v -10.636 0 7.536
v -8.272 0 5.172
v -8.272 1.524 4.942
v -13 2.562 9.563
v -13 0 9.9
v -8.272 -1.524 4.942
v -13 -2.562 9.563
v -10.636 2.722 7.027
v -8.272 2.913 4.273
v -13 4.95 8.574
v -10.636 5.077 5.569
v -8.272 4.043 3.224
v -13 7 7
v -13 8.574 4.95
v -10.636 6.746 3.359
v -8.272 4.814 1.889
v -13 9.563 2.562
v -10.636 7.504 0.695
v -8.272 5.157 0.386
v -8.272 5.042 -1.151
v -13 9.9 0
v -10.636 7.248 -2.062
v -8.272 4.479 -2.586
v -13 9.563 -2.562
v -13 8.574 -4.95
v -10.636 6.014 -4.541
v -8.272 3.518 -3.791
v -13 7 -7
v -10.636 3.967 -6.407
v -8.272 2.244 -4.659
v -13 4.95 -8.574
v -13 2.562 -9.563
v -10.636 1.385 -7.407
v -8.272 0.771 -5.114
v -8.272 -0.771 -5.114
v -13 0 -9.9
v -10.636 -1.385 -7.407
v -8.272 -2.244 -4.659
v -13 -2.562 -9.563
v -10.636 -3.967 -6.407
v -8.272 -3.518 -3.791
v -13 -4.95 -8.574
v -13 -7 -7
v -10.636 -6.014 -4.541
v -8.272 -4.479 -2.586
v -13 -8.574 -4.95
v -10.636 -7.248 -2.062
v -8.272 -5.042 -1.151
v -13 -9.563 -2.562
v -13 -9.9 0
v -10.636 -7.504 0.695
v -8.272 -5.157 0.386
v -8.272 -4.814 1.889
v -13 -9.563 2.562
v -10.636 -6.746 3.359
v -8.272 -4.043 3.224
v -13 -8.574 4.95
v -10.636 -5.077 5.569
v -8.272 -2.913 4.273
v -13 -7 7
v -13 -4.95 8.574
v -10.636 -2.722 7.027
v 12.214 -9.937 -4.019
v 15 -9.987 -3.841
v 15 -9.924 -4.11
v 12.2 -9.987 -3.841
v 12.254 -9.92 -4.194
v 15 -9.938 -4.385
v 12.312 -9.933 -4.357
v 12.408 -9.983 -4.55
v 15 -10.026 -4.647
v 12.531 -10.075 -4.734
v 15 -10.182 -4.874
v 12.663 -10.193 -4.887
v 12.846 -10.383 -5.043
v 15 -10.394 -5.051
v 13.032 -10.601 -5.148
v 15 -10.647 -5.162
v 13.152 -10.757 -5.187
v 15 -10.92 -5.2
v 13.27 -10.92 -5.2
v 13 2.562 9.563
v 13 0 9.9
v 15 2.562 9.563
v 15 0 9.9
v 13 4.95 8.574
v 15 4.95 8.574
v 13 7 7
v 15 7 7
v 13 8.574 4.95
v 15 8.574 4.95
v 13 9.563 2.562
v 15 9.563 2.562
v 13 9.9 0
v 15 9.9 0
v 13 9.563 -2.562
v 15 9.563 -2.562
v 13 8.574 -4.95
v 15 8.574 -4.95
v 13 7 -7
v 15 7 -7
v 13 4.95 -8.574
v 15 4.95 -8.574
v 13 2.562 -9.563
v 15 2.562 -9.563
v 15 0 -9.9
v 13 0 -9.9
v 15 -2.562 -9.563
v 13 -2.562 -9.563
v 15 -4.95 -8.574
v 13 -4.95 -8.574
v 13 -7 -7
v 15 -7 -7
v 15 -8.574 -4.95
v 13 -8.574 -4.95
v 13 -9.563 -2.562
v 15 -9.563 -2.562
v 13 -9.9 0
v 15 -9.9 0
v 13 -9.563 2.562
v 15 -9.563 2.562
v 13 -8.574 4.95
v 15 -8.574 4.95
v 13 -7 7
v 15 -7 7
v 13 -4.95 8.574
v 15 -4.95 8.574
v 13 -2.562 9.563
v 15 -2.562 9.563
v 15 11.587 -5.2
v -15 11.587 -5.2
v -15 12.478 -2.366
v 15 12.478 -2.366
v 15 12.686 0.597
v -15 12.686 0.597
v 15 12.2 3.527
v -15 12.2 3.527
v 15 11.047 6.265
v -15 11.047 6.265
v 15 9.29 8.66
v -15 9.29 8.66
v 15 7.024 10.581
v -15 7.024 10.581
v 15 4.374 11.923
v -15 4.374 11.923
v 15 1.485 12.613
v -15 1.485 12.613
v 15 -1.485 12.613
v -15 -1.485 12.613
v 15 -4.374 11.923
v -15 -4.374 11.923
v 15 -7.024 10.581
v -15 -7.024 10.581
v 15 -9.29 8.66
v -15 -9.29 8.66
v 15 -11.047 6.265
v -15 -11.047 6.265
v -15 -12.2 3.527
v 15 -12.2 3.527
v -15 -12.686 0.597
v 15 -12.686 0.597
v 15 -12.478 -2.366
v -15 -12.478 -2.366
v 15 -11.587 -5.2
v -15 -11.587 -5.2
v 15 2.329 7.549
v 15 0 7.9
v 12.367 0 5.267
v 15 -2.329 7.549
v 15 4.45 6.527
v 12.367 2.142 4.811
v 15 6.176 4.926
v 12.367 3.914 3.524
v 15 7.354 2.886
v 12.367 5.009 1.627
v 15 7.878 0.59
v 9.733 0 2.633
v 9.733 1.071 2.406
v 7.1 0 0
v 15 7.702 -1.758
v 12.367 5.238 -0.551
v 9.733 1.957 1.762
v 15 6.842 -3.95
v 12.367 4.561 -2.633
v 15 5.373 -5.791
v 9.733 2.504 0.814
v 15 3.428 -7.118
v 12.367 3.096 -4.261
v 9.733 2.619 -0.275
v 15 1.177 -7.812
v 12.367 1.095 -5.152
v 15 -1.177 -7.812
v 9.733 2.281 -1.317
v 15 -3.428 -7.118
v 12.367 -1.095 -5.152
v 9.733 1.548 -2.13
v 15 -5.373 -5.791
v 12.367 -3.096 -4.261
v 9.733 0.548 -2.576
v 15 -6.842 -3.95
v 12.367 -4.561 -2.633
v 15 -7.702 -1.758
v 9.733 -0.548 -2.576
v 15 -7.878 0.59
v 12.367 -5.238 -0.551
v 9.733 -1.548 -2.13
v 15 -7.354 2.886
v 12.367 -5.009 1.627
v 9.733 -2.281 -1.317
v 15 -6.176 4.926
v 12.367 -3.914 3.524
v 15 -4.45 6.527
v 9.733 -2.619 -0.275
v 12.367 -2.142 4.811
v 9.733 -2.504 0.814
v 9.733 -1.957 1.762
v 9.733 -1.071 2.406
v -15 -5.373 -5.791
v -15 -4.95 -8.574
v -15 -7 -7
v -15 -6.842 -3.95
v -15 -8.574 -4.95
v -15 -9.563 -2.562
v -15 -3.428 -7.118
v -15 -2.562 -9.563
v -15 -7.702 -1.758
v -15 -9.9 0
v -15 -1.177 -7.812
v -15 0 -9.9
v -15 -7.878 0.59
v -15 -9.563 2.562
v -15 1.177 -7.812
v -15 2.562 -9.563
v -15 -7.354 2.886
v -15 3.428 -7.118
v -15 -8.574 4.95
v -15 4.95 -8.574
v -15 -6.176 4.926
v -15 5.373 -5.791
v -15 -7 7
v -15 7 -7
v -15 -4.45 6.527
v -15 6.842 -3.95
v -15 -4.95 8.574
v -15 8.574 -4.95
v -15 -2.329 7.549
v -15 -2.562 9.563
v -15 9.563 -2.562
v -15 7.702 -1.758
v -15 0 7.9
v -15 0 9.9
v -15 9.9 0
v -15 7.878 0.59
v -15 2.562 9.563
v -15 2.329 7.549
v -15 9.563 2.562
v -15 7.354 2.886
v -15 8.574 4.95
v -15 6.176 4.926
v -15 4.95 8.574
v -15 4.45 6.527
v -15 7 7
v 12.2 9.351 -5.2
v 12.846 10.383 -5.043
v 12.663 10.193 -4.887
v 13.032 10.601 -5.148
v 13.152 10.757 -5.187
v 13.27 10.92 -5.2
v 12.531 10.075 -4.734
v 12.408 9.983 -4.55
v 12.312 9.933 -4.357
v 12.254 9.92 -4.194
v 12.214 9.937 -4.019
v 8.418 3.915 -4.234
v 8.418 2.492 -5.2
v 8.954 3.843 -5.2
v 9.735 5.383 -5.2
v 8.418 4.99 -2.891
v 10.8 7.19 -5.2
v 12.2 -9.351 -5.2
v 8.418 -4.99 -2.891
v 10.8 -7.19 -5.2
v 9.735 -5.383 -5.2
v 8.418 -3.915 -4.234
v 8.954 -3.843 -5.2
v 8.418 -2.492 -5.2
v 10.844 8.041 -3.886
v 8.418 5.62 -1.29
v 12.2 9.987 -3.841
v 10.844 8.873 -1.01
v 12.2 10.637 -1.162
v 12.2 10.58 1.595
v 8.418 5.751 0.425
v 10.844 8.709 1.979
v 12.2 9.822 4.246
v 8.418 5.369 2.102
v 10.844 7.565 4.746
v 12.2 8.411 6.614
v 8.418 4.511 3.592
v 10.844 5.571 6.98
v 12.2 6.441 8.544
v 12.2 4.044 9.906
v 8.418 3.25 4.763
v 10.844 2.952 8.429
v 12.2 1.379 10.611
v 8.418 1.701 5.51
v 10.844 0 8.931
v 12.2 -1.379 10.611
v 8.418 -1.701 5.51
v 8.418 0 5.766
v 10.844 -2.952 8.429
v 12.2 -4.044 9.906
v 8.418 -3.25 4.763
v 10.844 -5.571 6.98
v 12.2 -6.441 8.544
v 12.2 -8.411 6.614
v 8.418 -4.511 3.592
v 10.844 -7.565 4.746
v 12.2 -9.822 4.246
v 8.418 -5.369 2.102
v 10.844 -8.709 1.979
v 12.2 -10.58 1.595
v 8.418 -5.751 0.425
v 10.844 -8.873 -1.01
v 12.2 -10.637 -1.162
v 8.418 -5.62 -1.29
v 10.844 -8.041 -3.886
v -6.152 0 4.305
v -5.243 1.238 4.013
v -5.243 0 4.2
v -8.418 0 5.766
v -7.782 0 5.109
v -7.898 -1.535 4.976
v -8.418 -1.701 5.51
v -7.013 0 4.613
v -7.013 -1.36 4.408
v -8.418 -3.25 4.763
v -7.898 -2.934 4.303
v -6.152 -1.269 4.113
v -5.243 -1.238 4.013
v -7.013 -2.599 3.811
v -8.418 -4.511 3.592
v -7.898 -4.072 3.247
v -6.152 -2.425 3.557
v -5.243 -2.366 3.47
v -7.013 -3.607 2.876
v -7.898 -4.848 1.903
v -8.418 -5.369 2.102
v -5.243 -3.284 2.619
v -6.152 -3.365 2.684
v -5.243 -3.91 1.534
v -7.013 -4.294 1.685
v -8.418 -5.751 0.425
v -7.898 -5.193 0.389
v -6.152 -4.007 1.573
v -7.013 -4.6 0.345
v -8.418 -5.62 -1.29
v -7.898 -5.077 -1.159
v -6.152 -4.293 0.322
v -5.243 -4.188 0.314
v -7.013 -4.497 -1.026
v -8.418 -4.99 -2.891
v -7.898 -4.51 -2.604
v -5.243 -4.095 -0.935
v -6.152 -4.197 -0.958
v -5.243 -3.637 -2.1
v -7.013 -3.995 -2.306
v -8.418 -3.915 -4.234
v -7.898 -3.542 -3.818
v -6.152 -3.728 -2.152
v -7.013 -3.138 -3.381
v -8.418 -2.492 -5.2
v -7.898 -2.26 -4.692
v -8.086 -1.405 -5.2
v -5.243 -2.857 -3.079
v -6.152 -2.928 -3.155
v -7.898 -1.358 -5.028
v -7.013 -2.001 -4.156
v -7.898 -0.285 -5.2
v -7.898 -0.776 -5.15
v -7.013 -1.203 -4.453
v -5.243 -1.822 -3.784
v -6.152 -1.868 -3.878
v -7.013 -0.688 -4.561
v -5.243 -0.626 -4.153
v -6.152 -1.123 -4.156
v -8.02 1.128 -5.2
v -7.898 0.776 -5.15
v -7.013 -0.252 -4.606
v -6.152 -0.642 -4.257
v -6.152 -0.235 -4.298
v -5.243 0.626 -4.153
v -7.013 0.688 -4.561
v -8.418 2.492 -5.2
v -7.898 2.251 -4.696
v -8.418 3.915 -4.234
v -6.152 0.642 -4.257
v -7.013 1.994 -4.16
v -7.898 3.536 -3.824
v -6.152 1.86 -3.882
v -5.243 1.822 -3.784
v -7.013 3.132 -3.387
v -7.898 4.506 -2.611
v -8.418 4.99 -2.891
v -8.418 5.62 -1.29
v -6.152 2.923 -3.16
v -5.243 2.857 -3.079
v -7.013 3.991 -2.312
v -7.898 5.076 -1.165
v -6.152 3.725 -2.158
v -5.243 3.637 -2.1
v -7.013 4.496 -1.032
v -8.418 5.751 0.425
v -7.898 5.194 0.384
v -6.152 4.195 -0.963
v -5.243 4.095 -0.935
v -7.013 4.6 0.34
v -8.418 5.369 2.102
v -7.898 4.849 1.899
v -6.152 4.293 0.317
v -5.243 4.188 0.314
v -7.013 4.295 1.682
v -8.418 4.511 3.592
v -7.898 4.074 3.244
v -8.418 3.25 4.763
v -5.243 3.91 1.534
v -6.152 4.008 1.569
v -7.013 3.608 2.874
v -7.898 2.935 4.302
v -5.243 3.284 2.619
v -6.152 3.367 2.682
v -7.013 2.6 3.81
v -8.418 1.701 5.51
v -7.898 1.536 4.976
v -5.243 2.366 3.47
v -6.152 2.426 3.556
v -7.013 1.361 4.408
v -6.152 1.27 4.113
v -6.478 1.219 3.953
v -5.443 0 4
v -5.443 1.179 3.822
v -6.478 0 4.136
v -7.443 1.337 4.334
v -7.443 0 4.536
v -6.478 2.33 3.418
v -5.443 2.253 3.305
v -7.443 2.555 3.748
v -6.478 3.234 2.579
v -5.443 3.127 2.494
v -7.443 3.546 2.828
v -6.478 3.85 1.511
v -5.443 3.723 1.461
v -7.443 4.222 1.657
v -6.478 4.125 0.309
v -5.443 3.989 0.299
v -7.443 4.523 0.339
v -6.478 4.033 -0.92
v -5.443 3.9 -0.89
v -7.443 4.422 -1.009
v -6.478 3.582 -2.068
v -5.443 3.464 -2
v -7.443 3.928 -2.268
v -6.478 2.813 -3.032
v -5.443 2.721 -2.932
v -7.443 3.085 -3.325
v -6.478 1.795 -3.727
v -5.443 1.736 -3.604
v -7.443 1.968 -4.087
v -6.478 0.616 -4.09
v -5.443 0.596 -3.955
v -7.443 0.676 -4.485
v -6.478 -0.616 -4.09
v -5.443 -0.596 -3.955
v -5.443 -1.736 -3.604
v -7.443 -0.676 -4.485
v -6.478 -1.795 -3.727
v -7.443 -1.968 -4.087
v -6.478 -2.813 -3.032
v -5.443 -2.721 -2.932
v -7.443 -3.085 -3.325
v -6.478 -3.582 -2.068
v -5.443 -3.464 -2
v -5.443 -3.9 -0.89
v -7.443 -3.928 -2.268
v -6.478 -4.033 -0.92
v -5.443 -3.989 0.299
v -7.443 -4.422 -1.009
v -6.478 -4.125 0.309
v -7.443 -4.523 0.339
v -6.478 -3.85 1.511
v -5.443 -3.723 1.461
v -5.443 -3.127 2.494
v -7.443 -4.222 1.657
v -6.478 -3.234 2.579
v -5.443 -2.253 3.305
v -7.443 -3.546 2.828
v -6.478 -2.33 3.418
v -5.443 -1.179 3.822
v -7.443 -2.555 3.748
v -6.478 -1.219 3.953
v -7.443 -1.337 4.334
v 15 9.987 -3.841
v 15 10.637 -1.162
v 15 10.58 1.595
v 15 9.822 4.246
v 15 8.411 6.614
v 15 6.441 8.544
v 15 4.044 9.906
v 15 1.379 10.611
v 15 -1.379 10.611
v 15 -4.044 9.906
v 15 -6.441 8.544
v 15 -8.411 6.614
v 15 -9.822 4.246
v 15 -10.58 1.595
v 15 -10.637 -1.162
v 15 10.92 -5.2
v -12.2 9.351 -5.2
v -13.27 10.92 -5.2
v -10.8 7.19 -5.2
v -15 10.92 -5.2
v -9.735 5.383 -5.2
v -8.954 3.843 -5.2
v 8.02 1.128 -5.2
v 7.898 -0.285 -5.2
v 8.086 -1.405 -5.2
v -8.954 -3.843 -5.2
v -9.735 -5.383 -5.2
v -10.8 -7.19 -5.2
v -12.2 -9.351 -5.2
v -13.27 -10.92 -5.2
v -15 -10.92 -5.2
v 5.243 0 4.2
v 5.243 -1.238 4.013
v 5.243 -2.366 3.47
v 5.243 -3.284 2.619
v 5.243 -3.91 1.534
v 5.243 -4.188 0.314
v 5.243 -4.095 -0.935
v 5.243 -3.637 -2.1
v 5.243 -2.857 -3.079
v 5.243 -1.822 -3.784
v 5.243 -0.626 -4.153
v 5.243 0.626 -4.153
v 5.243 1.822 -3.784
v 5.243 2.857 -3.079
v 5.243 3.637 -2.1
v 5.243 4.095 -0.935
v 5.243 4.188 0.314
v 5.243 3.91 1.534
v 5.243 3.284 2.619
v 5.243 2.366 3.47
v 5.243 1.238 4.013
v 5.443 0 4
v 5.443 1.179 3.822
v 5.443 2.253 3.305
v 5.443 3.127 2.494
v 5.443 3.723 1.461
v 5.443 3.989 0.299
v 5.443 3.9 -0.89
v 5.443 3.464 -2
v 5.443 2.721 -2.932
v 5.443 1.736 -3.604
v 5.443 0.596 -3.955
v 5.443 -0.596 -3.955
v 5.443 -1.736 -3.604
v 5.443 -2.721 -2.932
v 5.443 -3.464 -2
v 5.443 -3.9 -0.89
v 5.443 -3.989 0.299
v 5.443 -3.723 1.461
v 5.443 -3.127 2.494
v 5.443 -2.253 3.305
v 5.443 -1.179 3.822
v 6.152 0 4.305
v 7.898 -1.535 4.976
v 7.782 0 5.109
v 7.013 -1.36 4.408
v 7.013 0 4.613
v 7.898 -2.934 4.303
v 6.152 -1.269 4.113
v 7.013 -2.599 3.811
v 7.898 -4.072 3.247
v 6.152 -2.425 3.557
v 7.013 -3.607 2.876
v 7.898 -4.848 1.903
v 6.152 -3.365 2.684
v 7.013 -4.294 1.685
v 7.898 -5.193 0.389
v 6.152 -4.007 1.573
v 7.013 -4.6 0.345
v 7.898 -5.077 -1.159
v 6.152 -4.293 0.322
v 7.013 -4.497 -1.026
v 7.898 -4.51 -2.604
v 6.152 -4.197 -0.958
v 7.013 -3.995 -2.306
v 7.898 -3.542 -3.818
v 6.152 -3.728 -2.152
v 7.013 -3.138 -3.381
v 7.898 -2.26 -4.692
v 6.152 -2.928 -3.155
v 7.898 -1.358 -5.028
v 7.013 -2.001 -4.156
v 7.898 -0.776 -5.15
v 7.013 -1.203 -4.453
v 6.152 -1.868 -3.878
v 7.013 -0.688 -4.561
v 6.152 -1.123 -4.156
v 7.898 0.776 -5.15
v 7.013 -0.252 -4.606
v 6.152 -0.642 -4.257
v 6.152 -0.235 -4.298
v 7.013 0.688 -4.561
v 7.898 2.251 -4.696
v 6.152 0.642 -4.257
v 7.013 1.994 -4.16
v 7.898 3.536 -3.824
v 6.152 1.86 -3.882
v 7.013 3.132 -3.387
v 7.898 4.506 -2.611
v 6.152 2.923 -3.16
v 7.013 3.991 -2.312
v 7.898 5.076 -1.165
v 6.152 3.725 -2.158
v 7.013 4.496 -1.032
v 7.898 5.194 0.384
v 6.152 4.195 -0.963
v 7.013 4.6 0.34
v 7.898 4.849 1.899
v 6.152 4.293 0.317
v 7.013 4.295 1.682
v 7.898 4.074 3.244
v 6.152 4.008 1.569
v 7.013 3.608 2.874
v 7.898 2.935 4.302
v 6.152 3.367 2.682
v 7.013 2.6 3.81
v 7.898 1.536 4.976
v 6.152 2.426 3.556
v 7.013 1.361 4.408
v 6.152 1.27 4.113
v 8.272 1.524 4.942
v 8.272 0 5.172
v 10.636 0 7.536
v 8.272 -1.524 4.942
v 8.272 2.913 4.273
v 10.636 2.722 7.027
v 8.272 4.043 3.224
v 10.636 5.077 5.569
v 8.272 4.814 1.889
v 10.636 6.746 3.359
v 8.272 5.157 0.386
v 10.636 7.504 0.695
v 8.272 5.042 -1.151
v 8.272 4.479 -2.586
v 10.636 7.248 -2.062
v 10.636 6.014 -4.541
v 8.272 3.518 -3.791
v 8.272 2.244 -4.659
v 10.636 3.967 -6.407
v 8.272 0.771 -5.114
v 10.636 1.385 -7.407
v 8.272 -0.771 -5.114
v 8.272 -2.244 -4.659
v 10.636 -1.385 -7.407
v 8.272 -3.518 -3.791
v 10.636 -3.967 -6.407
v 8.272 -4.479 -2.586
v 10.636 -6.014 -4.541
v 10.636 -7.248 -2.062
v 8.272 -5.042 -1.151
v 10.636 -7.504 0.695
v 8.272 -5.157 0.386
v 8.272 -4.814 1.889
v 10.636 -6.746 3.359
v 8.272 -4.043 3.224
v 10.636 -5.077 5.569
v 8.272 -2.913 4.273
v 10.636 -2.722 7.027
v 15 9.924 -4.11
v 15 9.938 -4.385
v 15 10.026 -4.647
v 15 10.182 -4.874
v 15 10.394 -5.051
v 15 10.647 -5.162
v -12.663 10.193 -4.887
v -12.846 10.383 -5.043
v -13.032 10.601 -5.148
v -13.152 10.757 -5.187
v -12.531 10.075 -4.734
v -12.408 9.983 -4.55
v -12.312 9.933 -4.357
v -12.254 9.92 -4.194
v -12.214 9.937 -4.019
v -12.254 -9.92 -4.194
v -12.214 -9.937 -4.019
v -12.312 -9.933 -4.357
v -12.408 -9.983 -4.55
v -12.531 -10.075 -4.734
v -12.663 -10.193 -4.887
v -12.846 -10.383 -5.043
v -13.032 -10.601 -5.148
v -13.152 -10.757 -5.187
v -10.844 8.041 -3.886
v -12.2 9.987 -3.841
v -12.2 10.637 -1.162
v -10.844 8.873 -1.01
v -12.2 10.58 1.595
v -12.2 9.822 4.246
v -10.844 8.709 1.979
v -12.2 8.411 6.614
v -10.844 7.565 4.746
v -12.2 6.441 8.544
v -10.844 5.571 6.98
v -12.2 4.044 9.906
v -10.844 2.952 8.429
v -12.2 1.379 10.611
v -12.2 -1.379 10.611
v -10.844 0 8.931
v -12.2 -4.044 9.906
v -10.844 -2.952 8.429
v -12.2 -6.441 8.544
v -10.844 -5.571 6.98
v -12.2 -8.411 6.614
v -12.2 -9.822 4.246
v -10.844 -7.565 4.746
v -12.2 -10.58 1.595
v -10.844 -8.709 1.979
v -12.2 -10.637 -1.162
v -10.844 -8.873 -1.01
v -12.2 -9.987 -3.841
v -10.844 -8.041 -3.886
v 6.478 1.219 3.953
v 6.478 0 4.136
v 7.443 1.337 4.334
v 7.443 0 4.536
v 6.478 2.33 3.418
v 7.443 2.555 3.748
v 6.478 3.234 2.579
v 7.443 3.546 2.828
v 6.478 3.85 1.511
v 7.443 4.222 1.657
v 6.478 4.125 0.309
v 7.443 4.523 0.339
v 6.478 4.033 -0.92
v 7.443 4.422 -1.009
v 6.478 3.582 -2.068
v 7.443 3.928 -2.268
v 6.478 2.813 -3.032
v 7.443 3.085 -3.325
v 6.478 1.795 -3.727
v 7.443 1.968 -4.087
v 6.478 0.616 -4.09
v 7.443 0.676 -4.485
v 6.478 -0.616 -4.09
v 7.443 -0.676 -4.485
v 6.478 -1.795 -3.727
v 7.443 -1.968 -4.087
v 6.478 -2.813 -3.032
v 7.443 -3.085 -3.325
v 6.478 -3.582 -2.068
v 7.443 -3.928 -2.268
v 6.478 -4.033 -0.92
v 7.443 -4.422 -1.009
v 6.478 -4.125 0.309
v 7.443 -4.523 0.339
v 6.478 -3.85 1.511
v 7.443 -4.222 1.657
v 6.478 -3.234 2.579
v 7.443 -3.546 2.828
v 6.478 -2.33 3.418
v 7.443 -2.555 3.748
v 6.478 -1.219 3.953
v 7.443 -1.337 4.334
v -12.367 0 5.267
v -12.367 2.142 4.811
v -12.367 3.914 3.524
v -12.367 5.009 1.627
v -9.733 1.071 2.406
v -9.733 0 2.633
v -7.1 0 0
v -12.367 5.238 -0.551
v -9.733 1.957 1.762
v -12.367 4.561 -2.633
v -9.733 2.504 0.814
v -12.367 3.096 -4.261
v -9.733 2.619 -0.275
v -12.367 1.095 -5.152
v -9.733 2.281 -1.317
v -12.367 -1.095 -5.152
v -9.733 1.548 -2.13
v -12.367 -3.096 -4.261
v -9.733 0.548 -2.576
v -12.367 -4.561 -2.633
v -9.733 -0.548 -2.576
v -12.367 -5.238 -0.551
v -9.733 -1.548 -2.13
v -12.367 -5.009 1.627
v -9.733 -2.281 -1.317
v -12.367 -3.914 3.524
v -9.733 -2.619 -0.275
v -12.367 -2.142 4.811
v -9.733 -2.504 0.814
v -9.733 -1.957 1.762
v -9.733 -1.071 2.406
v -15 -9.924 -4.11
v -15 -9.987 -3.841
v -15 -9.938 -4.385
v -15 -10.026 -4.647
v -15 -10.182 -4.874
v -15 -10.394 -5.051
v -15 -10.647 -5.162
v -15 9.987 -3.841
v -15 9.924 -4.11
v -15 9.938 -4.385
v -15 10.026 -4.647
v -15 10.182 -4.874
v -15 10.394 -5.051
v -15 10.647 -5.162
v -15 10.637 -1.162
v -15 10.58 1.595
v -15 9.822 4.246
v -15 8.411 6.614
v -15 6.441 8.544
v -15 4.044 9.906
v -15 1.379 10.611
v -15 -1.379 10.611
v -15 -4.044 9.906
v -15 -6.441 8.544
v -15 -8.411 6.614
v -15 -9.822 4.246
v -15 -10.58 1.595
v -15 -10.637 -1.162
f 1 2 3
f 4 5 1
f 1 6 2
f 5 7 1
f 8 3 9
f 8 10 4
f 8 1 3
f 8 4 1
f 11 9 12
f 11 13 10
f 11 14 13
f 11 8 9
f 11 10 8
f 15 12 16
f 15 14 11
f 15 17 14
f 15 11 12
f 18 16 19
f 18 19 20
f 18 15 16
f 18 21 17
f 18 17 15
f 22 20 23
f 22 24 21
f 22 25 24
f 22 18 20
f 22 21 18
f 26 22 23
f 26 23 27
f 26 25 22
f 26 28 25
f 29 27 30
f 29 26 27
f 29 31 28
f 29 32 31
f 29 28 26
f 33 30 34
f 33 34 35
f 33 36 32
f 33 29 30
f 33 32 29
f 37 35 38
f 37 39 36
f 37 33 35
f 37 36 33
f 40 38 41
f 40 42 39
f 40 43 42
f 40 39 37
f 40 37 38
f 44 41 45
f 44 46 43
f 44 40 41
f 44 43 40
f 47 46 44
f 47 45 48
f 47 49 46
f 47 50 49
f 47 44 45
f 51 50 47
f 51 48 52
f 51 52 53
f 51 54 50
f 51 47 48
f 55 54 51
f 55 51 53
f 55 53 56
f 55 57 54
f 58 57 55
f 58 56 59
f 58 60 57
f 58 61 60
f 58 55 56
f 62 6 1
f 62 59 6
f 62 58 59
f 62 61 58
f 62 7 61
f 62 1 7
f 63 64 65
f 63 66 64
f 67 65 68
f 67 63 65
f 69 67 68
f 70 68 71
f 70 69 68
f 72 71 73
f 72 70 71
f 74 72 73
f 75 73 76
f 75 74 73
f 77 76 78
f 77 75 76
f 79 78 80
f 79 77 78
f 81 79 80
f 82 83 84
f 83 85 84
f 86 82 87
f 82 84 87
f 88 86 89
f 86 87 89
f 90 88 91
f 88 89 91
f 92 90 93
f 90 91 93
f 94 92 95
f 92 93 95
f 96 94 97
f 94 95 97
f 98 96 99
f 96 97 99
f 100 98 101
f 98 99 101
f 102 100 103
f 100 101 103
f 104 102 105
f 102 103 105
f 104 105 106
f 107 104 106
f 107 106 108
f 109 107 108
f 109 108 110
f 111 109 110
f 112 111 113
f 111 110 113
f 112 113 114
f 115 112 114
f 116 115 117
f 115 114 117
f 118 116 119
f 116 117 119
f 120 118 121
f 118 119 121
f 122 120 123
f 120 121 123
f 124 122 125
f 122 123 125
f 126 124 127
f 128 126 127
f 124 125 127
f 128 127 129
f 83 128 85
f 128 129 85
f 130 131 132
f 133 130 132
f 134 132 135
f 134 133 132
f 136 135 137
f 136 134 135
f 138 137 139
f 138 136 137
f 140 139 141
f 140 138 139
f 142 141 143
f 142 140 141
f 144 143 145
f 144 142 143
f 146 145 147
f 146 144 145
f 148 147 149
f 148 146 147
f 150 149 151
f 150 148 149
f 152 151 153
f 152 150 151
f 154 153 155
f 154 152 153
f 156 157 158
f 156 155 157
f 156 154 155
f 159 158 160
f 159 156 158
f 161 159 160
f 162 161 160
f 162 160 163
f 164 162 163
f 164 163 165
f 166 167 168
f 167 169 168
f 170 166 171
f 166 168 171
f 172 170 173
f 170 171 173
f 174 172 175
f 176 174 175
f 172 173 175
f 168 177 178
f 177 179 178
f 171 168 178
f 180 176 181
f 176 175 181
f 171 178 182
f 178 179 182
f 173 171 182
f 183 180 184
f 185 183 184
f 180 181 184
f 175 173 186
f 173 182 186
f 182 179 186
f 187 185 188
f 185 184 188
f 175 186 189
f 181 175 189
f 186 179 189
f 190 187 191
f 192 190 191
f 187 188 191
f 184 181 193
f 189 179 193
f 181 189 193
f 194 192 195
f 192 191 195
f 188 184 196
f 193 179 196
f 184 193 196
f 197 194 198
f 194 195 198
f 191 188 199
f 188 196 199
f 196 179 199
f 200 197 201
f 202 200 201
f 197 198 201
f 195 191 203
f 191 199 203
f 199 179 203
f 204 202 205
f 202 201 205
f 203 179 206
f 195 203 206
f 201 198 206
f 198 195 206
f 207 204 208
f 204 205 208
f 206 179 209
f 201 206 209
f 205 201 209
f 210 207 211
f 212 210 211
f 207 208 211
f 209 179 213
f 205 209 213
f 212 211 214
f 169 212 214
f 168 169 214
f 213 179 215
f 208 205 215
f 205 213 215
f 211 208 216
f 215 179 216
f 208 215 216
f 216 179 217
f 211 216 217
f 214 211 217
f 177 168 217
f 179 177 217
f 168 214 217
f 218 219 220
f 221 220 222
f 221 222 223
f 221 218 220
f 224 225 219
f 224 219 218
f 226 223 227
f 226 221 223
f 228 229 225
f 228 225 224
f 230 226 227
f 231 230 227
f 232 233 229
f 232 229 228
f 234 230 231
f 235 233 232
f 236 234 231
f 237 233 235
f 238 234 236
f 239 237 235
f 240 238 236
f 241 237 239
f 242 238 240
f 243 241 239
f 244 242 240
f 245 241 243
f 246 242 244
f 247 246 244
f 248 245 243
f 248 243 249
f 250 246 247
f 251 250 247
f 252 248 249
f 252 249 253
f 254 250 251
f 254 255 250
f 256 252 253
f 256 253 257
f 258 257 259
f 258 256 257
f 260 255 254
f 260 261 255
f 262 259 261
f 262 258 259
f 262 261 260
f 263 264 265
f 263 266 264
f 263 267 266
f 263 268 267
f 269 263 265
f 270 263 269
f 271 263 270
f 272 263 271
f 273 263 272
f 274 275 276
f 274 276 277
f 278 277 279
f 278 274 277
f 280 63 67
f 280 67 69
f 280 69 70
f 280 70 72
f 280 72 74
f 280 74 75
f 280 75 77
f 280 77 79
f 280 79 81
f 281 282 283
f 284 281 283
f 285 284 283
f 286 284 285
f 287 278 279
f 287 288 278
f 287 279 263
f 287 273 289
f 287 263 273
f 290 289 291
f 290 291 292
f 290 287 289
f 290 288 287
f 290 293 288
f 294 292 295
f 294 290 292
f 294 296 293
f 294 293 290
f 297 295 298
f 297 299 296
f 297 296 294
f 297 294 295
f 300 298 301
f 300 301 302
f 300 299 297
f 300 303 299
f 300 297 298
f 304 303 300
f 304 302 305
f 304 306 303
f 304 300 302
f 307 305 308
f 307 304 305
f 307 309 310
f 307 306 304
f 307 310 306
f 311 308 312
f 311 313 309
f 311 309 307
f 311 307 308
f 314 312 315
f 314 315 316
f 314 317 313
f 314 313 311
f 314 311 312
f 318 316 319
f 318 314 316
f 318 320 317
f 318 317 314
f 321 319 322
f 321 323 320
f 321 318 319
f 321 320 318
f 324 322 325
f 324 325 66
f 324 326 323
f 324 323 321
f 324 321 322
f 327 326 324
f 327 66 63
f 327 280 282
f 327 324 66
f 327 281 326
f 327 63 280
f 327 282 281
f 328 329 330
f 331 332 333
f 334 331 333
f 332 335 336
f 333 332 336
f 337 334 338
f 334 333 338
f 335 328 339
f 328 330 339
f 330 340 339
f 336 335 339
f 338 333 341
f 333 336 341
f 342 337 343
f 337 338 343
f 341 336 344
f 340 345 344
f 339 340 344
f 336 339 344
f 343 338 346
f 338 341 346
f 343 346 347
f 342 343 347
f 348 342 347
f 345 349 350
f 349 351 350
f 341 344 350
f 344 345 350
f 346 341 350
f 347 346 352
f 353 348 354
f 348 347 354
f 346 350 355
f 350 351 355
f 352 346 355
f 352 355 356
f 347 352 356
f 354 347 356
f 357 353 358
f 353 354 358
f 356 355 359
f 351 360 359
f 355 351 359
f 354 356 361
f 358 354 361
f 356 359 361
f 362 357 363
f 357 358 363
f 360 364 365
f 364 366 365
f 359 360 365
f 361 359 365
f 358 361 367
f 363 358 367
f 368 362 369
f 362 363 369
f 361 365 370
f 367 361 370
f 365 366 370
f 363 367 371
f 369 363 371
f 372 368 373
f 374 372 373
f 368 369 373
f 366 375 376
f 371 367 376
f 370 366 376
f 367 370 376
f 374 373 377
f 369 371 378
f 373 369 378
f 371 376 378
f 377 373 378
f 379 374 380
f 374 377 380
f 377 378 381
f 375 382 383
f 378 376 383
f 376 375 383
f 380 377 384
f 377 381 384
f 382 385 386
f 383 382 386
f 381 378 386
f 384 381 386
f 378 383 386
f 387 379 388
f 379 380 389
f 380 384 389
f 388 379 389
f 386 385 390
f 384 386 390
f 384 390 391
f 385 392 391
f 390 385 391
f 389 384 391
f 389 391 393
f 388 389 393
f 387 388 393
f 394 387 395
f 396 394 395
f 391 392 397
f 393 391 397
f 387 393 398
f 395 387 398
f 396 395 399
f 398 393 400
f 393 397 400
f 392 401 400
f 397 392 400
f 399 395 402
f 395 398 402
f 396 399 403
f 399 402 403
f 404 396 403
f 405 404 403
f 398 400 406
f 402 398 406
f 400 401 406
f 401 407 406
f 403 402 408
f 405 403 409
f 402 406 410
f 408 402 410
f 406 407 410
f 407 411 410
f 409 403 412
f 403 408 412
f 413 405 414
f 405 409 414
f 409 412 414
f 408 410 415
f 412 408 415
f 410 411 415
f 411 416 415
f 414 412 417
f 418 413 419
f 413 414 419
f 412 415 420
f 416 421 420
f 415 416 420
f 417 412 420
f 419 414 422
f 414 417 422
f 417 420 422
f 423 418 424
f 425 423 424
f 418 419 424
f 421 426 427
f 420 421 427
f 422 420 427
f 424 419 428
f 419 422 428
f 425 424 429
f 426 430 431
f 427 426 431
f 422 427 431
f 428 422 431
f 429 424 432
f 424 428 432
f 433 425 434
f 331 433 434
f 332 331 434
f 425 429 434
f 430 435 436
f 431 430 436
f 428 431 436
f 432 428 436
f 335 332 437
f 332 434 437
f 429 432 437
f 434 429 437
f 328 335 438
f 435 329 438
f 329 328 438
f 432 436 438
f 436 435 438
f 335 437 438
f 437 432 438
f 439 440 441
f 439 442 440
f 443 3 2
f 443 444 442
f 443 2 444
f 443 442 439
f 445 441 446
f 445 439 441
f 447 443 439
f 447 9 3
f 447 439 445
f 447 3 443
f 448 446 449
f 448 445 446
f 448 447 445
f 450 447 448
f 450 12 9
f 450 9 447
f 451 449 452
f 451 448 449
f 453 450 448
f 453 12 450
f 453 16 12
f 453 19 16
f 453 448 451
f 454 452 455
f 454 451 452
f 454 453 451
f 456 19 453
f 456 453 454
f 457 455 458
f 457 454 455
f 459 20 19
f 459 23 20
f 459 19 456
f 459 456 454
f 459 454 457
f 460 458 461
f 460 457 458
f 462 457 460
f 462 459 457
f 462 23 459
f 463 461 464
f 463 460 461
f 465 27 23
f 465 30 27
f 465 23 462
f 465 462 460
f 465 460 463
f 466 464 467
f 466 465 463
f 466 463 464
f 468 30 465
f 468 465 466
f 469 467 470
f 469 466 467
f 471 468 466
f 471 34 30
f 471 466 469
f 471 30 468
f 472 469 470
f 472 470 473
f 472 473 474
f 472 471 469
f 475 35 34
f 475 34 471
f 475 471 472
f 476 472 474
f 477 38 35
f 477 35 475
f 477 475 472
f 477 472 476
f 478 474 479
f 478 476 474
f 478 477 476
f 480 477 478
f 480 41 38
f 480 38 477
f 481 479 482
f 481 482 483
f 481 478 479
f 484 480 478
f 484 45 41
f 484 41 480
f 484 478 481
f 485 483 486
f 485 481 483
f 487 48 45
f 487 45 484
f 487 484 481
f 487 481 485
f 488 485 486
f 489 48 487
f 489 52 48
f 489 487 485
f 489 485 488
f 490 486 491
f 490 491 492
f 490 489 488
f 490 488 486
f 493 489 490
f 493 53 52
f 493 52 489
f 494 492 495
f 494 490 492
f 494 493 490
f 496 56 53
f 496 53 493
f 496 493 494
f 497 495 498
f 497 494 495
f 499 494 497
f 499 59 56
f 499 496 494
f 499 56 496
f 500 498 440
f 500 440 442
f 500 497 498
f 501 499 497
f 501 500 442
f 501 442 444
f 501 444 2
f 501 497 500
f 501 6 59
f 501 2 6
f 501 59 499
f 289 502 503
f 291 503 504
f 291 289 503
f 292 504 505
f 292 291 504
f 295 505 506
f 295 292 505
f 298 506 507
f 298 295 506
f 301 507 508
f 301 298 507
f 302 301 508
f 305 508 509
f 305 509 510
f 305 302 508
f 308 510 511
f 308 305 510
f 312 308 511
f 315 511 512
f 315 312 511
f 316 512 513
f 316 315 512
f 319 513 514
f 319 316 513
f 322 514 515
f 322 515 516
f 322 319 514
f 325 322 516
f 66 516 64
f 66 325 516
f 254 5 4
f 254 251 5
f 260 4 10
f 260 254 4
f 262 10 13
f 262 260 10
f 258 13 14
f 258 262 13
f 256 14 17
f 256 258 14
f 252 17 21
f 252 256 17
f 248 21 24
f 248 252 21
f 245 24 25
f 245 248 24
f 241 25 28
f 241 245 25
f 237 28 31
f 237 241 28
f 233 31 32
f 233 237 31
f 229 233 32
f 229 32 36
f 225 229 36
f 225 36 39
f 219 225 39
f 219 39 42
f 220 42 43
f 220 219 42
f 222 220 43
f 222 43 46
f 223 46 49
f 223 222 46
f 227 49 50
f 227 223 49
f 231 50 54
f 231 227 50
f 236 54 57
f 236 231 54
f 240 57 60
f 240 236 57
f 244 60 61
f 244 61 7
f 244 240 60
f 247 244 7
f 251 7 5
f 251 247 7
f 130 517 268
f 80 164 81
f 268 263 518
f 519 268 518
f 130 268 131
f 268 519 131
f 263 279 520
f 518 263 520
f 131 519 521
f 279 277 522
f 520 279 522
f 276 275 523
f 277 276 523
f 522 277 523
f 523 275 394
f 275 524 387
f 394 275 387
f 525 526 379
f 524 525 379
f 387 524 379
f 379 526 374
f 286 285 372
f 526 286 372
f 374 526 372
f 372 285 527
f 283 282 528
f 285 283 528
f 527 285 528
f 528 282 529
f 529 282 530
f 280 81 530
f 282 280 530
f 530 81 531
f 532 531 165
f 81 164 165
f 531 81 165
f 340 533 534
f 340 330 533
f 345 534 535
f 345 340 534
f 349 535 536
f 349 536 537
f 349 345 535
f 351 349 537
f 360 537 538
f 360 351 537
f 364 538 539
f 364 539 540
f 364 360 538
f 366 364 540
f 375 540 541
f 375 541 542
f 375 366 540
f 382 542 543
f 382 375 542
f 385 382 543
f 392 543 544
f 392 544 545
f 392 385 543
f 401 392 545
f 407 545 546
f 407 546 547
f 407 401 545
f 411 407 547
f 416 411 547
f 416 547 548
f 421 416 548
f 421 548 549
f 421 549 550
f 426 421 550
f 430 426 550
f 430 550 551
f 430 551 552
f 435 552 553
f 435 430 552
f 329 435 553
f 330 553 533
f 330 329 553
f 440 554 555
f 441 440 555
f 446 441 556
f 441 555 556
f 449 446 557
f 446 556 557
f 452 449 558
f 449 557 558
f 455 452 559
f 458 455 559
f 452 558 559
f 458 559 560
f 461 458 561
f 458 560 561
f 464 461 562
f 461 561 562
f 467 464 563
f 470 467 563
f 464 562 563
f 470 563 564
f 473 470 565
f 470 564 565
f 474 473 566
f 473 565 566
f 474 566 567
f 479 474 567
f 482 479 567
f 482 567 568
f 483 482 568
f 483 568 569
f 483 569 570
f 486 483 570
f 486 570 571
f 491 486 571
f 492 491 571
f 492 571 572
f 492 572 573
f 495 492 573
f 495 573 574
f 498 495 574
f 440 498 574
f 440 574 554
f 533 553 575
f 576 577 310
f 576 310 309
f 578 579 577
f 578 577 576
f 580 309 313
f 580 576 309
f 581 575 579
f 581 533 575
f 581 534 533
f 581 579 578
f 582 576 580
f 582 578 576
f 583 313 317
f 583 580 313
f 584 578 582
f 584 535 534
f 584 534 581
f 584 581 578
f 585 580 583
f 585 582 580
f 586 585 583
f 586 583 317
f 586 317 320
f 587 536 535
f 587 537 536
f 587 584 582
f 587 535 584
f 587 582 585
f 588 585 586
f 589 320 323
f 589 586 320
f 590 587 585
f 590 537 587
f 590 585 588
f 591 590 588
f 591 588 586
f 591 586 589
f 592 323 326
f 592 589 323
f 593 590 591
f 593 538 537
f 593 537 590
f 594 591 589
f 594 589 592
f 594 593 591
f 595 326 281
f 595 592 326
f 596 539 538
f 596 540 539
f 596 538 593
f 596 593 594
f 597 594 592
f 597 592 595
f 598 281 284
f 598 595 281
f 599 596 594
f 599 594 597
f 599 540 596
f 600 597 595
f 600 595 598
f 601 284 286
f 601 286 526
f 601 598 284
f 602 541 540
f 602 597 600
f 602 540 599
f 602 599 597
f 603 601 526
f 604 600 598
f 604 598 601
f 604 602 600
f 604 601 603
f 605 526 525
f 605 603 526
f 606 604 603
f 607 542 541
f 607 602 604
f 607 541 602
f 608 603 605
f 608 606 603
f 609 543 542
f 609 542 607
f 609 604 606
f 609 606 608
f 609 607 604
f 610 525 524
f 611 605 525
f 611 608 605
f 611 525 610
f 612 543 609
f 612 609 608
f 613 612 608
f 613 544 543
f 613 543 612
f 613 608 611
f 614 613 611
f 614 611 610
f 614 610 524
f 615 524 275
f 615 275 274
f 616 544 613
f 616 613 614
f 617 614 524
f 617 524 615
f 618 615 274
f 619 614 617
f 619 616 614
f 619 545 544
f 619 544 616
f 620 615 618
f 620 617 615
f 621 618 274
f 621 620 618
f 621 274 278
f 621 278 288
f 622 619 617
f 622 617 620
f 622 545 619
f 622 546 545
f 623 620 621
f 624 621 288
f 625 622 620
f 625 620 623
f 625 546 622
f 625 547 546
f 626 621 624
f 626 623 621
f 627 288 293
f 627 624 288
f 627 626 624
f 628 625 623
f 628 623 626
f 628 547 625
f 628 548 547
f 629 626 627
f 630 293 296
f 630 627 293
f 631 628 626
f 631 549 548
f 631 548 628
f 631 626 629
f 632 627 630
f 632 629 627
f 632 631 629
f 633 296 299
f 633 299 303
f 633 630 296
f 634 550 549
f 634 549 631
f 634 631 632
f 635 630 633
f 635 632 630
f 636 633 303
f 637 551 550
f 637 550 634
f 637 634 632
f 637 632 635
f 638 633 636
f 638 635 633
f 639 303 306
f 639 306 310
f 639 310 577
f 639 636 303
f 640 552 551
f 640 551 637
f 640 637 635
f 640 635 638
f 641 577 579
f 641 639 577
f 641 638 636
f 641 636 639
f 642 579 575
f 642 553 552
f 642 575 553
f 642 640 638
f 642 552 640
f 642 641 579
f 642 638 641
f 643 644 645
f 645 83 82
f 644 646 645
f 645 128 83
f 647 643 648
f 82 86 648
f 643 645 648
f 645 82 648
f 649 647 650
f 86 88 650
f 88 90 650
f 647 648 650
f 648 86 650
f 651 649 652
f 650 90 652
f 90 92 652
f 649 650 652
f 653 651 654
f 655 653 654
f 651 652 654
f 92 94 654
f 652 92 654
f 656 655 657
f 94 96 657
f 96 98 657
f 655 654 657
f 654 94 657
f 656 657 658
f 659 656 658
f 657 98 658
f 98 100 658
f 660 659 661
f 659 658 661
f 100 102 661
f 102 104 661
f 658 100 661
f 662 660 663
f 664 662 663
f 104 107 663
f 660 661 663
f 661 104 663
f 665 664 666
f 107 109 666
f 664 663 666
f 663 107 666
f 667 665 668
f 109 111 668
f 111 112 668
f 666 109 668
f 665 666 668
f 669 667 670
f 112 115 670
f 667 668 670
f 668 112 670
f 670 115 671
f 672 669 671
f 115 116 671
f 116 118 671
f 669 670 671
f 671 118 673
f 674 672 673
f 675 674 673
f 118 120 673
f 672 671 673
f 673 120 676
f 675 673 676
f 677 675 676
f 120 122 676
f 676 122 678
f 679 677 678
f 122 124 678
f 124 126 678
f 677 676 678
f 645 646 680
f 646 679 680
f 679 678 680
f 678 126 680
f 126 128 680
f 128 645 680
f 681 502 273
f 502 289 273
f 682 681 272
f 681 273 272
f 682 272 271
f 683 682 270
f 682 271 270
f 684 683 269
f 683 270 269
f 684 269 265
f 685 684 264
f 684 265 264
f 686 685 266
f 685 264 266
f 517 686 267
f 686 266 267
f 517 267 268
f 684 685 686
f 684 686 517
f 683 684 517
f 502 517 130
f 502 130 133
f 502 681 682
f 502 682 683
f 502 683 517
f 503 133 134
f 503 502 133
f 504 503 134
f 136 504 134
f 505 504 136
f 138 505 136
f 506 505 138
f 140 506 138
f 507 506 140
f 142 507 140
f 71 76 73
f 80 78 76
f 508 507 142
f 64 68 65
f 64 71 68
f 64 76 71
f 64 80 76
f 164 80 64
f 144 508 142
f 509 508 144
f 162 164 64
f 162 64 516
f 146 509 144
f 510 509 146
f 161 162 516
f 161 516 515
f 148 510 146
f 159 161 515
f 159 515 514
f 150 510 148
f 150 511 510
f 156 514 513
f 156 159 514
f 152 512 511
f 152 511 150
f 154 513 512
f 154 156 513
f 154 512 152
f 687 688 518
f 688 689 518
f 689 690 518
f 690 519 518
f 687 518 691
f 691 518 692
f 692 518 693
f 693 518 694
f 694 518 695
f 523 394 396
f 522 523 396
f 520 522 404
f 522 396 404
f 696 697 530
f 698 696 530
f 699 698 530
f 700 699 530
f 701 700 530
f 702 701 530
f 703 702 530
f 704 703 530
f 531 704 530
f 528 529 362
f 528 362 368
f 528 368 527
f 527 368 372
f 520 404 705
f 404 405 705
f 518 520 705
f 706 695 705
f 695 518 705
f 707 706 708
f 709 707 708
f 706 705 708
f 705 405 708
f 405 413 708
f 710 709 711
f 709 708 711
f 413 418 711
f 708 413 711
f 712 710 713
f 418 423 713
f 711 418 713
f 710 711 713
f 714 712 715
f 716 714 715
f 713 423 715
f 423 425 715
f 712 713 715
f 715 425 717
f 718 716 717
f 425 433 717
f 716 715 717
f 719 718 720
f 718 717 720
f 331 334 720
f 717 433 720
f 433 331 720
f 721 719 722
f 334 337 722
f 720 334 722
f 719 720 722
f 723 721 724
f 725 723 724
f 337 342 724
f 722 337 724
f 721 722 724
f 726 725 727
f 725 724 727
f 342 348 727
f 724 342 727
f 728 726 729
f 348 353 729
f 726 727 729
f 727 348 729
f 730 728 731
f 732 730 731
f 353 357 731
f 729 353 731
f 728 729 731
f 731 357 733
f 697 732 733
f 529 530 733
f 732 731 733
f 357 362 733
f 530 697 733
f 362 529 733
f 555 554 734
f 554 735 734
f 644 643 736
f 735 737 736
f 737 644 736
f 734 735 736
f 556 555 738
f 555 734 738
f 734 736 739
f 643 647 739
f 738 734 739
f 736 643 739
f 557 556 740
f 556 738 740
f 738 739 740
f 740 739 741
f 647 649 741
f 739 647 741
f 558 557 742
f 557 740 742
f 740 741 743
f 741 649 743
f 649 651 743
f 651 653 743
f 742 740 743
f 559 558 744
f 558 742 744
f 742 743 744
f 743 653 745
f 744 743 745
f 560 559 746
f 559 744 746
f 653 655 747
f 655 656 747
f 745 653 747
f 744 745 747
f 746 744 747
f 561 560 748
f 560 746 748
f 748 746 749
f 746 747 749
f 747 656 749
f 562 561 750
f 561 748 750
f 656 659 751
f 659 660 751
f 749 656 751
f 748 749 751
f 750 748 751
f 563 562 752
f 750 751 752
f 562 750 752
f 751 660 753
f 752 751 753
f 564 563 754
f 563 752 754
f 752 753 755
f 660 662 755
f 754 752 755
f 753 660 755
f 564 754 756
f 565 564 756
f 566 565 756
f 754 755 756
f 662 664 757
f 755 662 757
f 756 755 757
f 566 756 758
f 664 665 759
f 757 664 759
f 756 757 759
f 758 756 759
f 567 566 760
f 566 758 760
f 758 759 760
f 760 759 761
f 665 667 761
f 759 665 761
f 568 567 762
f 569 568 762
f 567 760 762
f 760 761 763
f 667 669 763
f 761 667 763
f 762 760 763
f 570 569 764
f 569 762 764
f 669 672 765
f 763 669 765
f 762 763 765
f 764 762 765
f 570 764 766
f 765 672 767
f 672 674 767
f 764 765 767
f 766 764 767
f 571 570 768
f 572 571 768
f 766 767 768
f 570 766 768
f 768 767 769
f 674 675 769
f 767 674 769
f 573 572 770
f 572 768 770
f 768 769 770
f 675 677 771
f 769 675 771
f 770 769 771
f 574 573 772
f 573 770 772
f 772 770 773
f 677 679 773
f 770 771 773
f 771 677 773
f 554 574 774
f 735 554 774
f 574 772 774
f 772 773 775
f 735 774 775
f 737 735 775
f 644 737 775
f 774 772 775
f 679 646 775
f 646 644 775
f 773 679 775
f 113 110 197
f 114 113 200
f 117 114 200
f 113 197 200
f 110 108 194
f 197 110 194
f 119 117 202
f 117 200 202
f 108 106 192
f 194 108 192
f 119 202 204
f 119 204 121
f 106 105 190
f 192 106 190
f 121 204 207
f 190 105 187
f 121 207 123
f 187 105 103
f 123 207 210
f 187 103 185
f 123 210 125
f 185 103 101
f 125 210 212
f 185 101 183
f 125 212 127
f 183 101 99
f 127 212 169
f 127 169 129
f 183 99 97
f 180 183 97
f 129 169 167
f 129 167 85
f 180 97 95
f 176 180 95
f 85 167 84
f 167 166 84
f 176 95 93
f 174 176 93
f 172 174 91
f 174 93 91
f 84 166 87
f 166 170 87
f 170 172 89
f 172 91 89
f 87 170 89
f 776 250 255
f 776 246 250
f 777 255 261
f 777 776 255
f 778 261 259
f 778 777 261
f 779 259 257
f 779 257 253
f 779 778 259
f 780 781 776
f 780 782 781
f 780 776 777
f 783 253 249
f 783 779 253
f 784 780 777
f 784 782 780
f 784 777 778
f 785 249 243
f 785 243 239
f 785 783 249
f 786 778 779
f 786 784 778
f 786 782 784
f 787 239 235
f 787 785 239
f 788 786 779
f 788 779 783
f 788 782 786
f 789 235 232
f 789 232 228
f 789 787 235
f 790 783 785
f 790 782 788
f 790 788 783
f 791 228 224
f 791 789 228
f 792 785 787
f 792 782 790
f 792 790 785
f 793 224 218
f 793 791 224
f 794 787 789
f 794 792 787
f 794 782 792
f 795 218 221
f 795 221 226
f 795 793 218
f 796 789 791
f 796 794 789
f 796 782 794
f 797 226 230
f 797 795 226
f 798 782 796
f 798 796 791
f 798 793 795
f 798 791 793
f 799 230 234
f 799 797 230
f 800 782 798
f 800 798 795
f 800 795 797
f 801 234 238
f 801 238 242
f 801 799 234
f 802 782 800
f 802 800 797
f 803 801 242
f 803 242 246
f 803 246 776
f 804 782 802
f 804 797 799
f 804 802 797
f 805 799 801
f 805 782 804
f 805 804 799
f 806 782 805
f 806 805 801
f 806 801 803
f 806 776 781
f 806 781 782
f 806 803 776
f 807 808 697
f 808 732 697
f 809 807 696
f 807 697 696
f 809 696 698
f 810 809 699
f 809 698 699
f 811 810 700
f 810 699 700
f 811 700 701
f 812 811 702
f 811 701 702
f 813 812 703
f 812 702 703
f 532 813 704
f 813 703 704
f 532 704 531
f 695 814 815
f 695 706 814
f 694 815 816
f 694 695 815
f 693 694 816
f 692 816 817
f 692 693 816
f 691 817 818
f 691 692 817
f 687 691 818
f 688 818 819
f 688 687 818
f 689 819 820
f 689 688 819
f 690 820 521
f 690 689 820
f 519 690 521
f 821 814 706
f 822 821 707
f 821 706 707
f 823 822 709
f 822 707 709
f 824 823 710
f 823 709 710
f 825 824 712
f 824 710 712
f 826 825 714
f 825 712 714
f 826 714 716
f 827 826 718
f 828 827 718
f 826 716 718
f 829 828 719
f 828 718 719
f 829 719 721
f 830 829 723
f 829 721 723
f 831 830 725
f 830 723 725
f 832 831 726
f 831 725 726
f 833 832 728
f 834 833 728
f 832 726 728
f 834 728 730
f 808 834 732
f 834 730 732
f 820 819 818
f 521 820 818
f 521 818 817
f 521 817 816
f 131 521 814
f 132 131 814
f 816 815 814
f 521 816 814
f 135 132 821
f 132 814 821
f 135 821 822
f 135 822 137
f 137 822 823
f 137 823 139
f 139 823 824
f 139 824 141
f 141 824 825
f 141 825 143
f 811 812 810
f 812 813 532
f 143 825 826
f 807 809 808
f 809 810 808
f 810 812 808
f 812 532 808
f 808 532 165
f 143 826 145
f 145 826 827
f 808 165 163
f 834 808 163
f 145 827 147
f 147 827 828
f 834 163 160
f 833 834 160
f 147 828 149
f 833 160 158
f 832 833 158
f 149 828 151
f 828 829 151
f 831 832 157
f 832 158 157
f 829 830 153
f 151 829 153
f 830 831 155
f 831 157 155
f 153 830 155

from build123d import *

# Parameters (mm, degrees)
F9_W      = 15
F9_H      = 7.5
F11_DEPTH = 12.7
F15_R     = 1


with BuildPart() as f10:
    # F8 (on face) → F10 (revolve)
    with BuildSketch(Plane.XZ):
        with BuildLine():
            Line((-15, 12.7), (-15, 10.7))
            Line((-15, 10.7), (-12.2, 10.7))
            Line((-12.2, 10.7), (-8.4176005846, 5.7663121592))
            ThreePointArc((-8.4176005846, 5.7663121592), (-7.0130678726, 4.6128875566), (-5.2431457505, 4.2))
            Line((-5.2431457505, 4.2), (0, 4.2))
            Line((0, 4.2), (0, 12.7))
            Line((0, 12.7), (-15, 12.7))
        make_face()
    revolve(axis=Axis((-7.5, 0, 0), (1, 0, 0)))

    # F9 (on face) → F11 (cut, symmetric)
    with BuildSketch(Plane.XZ):
        with Locations((-7.5, -8.95)):
            Rectangle(F9_W, F9_H)
    extrude(amount=F11_DEPTH, both=True, mode=Mode.SUBTRACT)

    # F14: F10 across face


with BuildPart() as f12:
    # F6 (on Front) → F12 (revolve)
    with BuildSketch(Plane.XZ):
        with BuildLine():
            Line((-7.1, 0), (0, 0))
            Line((0, 0), (0, 4))
            Line((0, 4), (-5.4431457505, 4))
            ThreePointArc((-5.4431457505, 4), (-6.97387948, 4.30448187), (-8.2715728753, 5.1715728753))
            Line((-8.2715728753, 5.1715728753), (-13, 9.9))
            Line((-13, 9.9), (-15, 9.9))
            Line((-15, 9.9), (-15, 7.9))
            Line((-15, 7.9), (-7.1, 0))
        make_face()
    revolve(axis=Axis((-3.55, 0, 0), (-1, 0, 0)))

    # F13: F12 across face


with BuildPart() as f12_1:
    add(f12.part)
    add(f12.part.mirror(Plane.YZ))


with BuildPart() as f10_1:
    add(f10.part)
    add(f10.part.mirror(Plane(origin=(0, 0, 3.1787816923), x_dir=(0, 1, 0), z_dir=(1, 0, 0))))

    # F15
    f15_edges = [f10_1.edges().sort_by_distance(p)[0] for p in [
        (-13.6, -9.35147, -5.2),
        (-13.6, 9.35147, -5.2),
        (13.6, -9.35147, -5.2),
        (13.6, 9.35147, -5.2),
    ]]
    fillet(f15_edges, radius=F15_R)


solid = Compound([f12_1.part, f10_1.part])
